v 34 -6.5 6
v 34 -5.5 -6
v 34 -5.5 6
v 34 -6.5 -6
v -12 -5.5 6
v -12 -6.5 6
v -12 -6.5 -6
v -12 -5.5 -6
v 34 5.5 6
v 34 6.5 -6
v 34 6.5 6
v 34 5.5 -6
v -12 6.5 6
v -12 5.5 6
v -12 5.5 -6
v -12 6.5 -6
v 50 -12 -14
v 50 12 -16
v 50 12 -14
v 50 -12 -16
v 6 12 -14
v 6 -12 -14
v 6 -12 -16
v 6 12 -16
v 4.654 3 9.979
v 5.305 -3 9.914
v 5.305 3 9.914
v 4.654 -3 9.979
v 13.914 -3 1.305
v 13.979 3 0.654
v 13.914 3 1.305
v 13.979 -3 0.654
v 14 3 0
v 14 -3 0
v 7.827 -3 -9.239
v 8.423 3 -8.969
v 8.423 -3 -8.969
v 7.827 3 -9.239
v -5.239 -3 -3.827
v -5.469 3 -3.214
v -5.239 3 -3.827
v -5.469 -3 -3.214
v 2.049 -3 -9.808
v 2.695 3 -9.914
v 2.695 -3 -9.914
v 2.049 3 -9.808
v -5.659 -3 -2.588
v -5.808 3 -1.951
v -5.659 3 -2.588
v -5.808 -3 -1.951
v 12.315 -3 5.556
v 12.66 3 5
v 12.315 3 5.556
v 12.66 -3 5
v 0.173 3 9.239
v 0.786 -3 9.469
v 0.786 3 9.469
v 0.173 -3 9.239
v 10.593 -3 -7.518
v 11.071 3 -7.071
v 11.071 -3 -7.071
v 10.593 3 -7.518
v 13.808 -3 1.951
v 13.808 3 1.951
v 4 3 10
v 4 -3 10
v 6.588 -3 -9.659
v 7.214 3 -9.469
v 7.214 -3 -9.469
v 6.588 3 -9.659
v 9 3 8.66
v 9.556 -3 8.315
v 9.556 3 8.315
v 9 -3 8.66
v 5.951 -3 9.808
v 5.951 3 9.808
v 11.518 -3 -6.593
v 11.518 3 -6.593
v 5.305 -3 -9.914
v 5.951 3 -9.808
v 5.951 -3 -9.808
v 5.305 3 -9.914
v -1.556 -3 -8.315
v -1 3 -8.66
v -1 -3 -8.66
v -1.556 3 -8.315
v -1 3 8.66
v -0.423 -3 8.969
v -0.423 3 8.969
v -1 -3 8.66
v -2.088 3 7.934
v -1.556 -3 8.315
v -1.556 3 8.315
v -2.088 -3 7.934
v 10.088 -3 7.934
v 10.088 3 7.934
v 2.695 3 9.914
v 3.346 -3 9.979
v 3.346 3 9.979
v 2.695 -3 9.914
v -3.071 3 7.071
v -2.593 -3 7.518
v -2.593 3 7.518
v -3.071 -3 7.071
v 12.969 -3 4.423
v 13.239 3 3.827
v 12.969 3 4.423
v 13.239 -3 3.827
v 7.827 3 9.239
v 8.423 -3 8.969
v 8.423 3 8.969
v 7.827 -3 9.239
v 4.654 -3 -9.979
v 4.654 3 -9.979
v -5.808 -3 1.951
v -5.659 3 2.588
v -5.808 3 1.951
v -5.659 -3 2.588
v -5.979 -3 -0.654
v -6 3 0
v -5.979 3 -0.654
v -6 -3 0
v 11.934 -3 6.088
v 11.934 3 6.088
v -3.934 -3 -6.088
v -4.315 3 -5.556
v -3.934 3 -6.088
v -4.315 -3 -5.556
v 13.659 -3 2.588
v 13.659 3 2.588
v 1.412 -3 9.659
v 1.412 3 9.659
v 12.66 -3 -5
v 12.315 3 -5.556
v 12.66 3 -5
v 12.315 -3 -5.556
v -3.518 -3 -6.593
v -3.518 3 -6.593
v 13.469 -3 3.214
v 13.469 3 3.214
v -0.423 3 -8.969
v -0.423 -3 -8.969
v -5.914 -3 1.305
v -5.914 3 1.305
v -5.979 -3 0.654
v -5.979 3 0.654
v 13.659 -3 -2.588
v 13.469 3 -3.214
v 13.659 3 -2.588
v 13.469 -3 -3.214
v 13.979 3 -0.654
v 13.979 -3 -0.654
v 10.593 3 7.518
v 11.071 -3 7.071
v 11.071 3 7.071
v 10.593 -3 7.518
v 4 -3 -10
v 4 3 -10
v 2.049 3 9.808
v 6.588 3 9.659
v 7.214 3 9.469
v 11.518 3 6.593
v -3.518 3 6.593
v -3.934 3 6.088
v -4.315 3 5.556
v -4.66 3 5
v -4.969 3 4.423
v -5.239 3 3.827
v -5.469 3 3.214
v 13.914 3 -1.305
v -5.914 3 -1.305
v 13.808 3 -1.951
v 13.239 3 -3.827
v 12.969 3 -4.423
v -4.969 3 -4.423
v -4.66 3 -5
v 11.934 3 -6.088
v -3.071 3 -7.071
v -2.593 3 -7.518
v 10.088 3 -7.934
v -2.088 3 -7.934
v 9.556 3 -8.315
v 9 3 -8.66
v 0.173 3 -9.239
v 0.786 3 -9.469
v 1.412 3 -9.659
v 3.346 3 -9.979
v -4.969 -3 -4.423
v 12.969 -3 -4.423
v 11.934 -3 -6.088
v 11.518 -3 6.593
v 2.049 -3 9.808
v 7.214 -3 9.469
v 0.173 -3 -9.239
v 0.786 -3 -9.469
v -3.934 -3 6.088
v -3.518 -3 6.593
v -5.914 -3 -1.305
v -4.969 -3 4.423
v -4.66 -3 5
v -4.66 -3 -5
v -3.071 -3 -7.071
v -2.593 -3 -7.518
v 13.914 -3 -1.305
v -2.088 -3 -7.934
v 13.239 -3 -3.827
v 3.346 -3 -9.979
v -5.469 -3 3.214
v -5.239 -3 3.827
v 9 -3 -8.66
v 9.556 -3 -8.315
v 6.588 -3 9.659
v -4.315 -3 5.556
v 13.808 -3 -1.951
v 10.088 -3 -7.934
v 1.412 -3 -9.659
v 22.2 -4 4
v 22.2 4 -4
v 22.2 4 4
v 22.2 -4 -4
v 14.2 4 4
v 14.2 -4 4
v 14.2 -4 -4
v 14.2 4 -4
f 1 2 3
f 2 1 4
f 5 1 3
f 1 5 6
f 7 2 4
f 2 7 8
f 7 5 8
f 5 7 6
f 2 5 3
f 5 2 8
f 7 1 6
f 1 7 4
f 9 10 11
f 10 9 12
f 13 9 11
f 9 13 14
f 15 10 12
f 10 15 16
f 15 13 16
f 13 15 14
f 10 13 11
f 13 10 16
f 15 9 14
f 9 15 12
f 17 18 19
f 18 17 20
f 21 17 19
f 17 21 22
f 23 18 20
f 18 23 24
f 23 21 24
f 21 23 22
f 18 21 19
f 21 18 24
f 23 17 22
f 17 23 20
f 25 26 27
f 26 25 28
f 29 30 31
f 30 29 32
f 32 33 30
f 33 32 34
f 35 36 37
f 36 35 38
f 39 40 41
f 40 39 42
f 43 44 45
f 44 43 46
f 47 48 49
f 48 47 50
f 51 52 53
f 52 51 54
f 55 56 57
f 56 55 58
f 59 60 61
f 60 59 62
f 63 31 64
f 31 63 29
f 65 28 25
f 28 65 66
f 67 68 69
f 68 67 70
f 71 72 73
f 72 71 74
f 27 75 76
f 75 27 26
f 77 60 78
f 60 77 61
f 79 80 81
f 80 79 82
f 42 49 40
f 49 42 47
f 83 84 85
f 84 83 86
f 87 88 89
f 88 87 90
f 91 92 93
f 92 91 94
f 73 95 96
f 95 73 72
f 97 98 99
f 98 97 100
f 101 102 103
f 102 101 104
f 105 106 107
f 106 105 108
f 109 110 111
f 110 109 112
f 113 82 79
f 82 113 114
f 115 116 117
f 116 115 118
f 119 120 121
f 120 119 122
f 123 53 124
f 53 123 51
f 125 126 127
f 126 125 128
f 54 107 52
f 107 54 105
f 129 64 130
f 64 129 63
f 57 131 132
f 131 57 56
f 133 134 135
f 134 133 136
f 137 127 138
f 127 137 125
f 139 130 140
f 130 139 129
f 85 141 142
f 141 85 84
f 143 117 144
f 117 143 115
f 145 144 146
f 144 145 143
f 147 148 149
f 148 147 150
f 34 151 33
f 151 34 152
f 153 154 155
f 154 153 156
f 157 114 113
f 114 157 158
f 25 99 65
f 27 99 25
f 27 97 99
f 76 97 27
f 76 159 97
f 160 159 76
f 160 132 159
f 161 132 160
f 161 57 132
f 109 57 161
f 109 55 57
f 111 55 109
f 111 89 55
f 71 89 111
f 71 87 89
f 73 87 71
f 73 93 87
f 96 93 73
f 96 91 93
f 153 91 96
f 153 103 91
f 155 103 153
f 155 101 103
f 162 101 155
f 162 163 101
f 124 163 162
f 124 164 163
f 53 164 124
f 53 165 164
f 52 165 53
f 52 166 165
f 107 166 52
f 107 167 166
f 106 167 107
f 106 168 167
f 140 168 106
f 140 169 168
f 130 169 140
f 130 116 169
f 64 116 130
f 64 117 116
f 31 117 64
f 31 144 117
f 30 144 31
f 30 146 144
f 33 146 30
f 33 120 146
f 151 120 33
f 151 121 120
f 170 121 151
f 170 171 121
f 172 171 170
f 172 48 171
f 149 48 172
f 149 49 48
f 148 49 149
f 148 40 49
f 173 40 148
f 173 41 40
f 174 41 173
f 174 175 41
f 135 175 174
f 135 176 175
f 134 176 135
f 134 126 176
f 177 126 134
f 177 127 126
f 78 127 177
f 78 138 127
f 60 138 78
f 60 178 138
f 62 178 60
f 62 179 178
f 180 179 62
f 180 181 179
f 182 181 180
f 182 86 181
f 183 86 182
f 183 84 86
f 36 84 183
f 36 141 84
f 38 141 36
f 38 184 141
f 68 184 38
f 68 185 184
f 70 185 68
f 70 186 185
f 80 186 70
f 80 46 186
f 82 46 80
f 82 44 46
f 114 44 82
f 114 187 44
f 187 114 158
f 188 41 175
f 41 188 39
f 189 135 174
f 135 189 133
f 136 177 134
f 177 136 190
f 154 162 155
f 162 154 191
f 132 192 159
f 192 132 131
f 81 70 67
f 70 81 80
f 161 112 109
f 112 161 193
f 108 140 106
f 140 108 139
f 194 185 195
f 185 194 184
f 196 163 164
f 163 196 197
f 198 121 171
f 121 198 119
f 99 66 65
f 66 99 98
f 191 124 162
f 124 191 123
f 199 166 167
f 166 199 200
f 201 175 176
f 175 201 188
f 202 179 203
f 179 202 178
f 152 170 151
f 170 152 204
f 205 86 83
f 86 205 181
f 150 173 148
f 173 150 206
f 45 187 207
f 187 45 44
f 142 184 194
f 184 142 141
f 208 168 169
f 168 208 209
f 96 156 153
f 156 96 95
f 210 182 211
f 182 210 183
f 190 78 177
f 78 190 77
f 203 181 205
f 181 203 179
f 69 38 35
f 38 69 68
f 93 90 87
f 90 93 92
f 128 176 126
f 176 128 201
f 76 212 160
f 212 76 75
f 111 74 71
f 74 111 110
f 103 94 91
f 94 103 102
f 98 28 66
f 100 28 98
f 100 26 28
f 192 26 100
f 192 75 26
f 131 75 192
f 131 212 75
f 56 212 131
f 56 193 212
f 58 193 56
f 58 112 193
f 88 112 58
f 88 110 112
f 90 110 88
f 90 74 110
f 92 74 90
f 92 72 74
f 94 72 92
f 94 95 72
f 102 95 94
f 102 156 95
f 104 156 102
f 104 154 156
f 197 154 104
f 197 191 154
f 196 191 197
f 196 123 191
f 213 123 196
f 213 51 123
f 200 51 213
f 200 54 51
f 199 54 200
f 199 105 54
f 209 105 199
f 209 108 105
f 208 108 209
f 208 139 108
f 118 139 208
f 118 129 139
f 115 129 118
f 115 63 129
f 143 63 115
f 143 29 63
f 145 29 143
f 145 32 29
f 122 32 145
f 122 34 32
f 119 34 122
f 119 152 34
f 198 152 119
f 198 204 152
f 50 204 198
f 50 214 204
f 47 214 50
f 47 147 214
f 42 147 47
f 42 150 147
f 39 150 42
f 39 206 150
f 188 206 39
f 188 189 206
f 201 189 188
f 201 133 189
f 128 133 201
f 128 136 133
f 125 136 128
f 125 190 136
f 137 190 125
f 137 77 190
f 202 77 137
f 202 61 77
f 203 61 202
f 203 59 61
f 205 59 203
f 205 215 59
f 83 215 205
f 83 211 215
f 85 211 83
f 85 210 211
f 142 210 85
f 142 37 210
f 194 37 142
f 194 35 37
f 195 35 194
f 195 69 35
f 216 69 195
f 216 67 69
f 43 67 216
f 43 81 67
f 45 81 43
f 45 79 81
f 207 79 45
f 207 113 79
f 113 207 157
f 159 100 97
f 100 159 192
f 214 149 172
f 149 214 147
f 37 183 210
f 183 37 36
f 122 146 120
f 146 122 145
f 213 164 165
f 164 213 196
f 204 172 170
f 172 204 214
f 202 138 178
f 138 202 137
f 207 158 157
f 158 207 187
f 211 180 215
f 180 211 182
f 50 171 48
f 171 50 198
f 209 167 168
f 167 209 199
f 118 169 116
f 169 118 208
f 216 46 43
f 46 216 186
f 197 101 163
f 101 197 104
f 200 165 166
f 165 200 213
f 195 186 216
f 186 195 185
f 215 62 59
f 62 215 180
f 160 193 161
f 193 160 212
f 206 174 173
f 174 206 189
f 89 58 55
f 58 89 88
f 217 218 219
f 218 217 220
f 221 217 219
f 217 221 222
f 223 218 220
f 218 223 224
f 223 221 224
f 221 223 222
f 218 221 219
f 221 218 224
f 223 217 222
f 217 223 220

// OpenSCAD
// Eccentric disk cam with a flat translating follower.
// Two-dimensional mechanism in the XZ plane; the cam rotates about +Y.
// The follower face is perpendicular to +X and moves along X.
cam_angle = 0;
agentscad_part = "all";
eccentricity = 4;
cam_radius = 10;
cam_thickness = 6;
follower_gap = 0.2;
follower_length = 8;
follower_width = 8;
follower_height = 8;
$fn = 96;

module frame_local() {
  // Base plate below the mechanism.
  translate([6, -12, -16]) cube([44, 24, 2]);
  // Two guide rails around the follower; they do not touch the cam.
  for (yy = [-6.5, 5.5]) translate([-12, yy, -6]) cube([46, 1, 12]);
}

module cam_local() {
  // Eccentric disk in the XZ plane; the shaft is omitted so the frame needs no bearing.
  rotate([90, 0, 0]) translate([eccentricity, 0, 0]) cylinder(r = cam_radius, h = cam_thickness, center = true);
}

module follower_local() {
  // Flat face at x = R + e cos(theta) + gap; block extends to +X.
  xpos = cam_radius + eccentricity * cos(cam_angle) + follower_gap;
  translate([xpos, -follower_width / 2, -follower_height / 2])
    cube([follower_length, follower_width, follower_height]);
}

module assembly() {
  if (agentscad_part == "all" || agentscad_part == "frame") frame_local();
  if (agentscad_part == "all" || agentscad_part == "cam") rotate([0, cam_angle, 0]) cam_local();
  if (agentscad_part == "all" || agentscad_part == "follower") follower_local();
}

assembly();
